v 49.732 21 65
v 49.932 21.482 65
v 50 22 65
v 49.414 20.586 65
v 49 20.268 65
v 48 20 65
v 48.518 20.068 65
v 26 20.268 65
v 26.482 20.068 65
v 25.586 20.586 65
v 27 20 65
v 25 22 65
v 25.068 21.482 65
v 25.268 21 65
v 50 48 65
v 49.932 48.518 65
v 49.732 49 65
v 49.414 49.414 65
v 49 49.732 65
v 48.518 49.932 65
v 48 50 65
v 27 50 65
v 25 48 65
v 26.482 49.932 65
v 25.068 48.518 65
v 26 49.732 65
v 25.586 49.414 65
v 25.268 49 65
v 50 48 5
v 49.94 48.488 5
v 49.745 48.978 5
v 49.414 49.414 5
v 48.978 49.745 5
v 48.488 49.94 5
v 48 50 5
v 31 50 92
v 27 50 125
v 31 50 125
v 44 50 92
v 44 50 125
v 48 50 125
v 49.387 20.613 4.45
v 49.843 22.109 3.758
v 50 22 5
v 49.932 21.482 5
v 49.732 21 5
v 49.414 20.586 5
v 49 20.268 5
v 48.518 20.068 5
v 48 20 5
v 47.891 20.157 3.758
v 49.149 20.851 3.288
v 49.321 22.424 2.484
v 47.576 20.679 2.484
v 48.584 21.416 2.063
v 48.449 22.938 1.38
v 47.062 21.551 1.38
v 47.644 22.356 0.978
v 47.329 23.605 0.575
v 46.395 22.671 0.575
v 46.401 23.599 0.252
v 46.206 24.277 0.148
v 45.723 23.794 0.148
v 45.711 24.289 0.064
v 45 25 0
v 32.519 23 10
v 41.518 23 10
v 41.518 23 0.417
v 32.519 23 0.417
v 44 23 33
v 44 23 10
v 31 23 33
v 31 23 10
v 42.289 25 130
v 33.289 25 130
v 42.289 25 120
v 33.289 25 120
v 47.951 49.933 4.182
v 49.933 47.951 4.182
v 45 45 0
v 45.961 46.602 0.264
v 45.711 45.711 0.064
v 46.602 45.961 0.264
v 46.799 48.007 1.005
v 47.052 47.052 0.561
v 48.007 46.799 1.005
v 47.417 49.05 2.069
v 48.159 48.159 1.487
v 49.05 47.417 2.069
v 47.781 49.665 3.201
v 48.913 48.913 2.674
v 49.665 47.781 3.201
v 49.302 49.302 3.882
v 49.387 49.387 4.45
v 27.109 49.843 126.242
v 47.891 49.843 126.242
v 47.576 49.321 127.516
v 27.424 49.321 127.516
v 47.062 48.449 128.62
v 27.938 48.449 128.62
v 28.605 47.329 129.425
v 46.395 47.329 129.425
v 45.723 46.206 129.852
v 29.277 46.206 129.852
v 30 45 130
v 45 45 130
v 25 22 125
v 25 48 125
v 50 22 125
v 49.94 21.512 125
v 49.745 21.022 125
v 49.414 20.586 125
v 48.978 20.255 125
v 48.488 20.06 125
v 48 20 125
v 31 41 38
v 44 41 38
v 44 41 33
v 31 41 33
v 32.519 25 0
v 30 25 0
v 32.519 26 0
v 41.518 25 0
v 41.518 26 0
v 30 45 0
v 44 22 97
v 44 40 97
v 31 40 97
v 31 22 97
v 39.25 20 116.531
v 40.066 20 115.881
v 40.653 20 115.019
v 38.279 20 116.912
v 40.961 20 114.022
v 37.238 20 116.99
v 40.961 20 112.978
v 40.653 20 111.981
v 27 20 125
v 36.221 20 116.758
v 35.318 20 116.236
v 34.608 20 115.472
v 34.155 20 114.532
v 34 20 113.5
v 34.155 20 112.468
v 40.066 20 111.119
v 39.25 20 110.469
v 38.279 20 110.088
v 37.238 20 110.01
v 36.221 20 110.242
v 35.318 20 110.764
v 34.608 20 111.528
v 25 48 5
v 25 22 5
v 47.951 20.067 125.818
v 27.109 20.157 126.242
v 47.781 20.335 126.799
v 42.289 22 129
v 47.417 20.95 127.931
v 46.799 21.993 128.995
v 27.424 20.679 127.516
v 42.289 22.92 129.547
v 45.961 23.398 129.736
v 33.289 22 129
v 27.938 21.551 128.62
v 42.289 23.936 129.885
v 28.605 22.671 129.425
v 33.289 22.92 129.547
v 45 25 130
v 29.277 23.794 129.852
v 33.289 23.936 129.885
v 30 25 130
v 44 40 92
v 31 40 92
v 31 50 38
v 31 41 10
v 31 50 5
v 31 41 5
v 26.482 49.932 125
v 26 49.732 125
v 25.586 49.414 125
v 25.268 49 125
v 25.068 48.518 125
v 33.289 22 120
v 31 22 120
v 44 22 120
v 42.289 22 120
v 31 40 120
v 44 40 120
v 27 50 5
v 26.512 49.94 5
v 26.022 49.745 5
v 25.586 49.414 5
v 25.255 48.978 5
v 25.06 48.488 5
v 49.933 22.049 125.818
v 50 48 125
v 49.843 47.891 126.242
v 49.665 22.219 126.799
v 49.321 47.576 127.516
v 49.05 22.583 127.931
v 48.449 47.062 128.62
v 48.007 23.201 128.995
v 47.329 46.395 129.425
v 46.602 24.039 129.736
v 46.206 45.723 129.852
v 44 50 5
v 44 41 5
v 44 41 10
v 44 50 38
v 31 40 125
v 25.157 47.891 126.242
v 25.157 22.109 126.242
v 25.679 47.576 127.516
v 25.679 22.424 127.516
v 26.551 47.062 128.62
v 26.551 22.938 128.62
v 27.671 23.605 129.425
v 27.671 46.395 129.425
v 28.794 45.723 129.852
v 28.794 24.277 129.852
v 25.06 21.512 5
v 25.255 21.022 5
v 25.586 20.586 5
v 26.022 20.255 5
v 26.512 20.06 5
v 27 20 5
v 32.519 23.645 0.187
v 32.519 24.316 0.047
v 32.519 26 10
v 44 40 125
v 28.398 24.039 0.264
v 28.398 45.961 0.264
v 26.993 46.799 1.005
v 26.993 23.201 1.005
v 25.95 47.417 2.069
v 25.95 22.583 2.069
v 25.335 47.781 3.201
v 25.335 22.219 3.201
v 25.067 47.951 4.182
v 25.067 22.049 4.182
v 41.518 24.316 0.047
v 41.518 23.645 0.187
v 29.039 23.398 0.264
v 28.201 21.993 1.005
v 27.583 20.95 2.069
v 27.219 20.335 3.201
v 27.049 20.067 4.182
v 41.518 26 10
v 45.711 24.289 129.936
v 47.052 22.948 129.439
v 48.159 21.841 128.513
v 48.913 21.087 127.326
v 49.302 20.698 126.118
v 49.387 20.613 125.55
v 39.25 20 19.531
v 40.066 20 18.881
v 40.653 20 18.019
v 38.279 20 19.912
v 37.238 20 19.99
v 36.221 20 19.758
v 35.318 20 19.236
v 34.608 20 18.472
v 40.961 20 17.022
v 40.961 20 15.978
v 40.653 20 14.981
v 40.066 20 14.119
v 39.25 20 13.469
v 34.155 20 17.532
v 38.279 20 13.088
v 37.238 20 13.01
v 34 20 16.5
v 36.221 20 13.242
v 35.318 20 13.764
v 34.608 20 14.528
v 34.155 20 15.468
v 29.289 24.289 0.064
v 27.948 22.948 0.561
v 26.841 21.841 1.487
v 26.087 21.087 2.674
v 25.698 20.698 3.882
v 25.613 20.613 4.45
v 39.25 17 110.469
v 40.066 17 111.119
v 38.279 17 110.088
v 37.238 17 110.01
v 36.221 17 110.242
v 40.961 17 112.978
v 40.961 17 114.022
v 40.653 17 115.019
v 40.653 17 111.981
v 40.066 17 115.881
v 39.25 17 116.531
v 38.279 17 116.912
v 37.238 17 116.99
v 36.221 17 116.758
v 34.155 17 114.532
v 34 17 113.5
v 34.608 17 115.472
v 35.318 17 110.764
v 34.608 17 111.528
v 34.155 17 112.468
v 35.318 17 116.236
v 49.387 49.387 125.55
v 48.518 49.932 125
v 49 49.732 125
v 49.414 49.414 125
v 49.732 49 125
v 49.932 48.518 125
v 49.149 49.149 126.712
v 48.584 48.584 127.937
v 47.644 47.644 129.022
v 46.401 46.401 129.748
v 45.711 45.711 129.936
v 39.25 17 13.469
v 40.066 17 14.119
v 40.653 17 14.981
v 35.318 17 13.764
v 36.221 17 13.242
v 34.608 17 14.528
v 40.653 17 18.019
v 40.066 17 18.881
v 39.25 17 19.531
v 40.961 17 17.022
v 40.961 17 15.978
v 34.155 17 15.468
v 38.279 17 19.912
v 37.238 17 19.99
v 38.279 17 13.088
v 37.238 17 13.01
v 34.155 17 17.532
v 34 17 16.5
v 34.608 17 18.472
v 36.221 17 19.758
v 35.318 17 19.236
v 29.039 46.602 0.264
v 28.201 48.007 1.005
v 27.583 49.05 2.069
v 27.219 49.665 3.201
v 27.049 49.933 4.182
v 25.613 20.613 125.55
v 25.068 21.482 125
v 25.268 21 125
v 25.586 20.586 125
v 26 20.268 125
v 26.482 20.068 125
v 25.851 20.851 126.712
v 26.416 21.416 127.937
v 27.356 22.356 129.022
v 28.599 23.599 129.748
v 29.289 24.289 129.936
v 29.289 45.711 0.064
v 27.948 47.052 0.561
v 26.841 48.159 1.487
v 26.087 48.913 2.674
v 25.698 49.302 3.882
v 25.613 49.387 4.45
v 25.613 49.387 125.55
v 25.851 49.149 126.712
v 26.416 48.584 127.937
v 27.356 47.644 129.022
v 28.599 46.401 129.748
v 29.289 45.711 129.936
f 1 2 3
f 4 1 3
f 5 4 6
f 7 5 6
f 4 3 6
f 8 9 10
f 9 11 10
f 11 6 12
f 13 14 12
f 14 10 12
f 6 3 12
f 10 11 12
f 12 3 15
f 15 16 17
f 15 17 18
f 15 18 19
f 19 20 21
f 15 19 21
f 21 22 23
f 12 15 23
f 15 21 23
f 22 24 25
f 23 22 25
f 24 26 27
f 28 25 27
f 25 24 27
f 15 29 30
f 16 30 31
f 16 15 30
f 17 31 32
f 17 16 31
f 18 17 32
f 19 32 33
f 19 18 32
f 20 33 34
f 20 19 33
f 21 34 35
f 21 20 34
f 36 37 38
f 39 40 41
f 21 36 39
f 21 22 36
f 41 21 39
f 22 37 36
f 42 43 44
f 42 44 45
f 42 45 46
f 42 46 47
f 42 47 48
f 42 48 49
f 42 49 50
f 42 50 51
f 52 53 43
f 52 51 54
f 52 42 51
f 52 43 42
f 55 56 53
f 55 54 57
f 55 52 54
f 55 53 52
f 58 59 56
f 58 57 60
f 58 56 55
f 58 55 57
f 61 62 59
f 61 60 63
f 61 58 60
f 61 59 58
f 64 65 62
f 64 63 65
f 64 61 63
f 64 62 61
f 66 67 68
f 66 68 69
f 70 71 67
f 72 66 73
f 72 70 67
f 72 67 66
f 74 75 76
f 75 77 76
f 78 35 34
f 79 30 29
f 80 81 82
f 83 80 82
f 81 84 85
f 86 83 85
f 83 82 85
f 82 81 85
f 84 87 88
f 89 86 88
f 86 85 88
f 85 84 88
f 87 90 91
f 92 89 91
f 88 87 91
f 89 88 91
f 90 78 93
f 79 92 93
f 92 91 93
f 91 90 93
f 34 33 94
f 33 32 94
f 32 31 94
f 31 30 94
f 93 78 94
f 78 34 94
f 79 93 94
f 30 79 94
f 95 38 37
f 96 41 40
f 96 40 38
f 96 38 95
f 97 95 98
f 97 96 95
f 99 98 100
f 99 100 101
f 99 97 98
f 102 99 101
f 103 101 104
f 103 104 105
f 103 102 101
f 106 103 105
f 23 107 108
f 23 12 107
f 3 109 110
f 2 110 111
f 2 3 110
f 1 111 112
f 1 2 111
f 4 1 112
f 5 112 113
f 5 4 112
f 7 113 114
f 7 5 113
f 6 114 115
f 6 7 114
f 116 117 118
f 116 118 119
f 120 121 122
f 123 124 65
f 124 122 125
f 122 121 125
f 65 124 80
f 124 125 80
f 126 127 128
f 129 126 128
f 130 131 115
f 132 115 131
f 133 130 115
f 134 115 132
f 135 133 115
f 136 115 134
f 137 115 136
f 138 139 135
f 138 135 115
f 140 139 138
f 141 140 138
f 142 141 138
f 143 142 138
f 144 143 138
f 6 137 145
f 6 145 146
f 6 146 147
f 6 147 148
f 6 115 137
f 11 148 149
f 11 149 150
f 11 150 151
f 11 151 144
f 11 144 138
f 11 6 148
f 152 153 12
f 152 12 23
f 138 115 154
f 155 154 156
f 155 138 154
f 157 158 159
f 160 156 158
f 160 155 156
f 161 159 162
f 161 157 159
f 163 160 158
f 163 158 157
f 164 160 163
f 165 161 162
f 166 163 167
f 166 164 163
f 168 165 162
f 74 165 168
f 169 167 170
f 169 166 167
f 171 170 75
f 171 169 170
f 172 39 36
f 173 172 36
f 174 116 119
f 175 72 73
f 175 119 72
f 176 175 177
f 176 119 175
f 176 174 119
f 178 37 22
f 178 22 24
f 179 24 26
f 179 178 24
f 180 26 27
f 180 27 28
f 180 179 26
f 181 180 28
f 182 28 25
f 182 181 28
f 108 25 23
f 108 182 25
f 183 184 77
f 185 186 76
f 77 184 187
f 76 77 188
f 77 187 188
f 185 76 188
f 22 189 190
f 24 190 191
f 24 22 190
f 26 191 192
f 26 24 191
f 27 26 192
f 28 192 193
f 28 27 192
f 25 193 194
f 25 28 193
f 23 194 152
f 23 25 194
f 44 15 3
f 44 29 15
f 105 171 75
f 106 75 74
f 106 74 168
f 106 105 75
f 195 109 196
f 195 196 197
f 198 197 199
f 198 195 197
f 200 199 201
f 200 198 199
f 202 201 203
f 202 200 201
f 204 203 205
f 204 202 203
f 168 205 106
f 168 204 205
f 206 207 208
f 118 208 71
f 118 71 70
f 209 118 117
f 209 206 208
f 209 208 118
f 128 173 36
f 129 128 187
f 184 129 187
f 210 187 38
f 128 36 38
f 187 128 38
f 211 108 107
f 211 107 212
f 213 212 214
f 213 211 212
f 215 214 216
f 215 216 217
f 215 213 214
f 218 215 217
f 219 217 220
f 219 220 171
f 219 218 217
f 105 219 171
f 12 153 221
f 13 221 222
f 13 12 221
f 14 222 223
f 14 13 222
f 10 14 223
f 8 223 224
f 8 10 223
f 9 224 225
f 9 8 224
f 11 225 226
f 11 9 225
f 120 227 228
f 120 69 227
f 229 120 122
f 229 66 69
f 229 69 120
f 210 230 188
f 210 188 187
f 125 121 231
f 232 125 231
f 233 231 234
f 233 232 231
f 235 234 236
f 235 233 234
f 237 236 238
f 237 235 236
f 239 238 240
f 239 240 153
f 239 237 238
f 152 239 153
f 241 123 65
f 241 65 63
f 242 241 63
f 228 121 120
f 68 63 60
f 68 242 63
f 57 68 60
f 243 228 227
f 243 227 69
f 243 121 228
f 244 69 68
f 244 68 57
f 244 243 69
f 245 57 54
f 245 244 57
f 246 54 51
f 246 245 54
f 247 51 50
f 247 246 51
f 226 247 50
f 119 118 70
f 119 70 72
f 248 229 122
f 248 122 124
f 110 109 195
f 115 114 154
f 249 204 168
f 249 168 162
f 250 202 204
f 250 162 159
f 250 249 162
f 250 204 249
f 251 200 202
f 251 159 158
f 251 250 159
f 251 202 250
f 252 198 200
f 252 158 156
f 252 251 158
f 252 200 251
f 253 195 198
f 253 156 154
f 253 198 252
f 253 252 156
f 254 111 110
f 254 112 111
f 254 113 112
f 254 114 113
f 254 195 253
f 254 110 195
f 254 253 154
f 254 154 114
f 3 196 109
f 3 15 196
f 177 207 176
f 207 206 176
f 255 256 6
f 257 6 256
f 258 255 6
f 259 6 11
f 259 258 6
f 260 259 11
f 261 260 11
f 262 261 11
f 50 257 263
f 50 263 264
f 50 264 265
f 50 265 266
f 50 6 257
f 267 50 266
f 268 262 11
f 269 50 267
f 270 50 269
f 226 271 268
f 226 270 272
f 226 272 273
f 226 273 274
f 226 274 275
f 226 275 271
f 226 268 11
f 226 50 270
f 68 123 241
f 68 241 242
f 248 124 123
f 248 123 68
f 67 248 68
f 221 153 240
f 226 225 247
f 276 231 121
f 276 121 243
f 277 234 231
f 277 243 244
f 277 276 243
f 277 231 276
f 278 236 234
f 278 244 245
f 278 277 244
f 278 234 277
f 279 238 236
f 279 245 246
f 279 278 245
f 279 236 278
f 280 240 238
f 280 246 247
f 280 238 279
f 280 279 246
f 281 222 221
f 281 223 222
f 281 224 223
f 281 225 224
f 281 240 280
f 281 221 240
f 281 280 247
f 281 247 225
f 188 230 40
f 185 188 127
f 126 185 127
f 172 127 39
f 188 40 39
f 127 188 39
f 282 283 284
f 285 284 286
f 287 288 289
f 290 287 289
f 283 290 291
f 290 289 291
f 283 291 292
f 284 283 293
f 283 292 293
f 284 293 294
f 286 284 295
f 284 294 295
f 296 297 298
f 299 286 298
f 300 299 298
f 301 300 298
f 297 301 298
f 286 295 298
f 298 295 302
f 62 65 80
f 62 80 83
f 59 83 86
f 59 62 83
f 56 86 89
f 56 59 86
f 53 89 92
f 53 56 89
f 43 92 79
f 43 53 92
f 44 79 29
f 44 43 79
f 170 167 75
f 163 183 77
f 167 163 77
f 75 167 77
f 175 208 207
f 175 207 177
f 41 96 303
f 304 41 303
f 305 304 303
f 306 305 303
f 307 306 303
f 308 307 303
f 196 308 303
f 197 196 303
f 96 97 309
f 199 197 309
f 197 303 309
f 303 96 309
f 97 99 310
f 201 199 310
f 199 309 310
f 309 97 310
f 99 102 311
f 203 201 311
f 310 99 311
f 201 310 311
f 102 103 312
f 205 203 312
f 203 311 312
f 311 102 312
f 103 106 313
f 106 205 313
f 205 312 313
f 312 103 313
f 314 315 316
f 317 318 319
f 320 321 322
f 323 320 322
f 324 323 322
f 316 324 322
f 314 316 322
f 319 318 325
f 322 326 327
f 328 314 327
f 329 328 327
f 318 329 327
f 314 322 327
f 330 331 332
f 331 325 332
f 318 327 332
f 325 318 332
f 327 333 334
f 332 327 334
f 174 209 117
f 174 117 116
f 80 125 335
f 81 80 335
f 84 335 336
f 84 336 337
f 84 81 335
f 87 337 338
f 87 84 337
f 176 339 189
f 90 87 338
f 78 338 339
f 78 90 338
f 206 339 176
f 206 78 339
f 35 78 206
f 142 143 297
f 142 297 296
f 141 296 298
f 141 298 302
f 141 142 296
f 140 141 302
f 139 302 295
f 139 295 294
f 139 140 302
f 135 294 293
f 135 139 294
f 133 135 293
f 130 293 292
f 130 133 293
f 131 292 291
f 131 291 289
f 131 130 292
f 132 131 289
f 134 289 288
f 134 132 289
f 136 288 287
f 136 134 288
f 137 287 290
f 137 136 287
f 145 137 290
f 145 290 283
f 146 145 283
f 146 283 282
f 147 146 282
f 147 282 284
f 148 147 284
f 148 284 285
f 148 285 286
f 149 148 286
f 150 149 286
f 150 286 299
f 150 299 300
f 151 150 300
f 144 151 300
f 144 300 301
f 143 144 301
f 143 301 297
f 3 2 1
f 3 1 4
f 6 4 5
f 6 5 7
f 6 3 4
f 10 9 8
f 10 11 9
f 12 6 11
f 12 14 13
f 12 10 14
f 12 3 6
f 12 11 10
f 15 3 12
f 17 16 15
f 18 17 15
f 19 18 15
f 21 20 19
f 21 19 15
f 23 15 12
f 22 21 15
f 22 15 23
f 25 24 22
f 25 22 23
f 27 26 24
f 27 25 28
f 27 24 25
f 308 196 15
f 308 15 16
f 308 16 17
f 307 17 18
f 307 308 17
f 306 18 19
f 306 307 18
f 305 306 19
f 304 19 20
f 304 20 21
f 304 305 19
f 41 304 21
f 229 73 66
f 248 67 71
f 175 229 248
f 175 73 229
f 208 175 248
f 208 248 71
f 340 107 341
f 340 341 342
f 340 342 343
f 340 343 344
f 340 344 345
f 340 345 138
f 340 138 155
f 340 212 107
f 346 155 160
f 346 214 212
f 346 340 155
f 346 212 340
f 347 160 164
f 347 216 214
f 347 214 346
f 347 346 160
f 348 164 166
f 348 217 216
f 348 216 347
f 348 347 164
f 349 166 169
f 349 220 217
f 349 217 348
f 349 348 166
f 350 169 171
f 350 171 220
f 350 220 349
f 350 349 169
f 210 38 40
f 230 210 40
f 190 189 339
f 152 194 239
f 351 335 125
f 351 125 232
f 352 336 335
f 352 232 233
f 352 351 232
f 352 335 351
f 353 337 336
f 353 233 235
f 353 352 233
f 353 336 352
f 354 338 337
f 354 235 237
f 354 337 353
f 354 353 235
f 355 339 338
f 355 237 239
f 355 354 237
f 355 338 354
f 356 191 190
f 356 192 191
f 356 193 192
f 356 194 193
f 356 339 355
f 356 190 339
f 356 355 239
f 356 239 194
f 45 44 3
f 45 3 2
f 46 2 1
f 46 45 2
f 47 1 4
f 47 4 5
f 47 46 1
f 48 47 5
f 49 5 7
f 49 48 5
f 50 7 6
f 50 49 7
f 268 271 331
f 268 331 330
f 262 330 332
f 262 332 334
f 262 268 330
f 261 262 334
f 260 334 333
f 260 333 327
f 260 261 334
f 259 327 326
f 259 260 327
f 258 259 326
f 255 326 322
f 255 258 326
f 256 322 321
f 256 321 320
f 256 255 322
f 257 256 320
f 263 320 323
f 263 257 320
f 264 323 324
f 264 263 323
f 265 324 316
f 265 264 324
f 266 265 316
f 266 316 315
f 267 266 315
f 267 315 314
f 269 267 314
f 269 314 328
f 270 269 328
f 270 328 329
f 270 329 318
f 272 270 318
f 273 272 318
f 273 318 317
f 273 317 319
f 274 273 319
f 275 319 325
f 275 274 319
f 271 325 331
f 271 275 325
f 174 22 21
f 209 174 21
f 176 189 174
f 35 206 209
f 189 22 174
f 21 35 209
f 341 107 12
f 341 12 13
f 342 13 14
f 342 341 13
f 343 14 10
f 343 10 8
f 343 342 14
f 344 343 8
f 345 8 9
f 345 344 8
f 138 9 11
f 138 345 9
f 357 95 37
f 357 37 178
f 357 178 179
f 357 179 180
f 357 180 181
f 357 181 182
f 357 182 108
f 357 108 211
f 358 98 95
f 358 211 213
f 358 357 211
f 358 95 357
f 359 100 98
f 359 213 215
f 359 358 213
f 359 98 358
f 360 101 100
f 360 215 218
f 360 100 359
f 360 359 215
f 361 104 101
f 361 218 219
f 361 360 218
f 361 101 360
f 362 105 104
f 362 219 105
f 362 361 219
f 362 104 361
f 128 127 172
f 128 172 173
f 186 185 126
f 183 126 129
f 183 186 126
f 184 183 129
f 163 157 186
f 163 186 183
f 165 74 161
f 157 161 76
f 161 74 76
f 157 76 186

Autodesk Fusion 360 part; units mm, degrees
sketch "Sketch1" plane through (0, 0, 0) normal (0, 0, 1) x (1, 0, 0)
  line L0 (25, 50) -> (55, 50)
  line L1 (55, 50) -> (55, 20)
  line L2 (55, 20) -> (25, 20)
  line L3 (25, 20) -> (25, 50)
extrude "Extrude1" add sketch "Sketch1" along normal blind 150 makes body 1
extrude "Extrude2" cut 1 faces at (55, 40, 50) along direction (-1, 0, 0) blind 5 on bodies 1 bodies 1
extrude "Extrude3" cut 1 faces at (33.3333, 30, 150) along direction (0, 0, -1) blind 10 on bodies 1 bodies 1
fillet "Fillet7" radius 5 1 faces at (33.3333, 30, 140) on bodies 1
fillet "Fillet8" radius 5 1 faces at (33.3333, 30, 0) on bodies 1
fillet "Fillet9" radius 2 14 faces at (33.3333, 50, 48.3333) (34.5665, 46.749, 0.3159) (35, 38.3333, 0) (34.9025, 24.4637, 0.0288) (41.6667, 20, 48.3333) (34.9025, 24.4637, 139.9712) (35, 38.3333, 140) (34.5665, 46.749, 139.6841) (29.4637, 31.5691, 139.9712) (25, 30, 48.3333) (29.4637, 31.5691, 0.0288) (46.749, 38.7668, 139.6841) (50, 40, 48.3333) (46.749, 38.7668, 0.3159) on bodies 1
sketch "Sketch4" plane through (0, 50, 0) normal (0, 1, 0) x (-1, 0, 0)
  line L0 (-48, 135) -> (-48, 5)
  line L1 (-48, 5) -> (-27, 5)
  line L2 (-27, 5) -> (-27, 135)
  line L3 (-27, 135) -> (-48, 135)
  line L4 (-37.5, 5) -> (-31, 5)
  line L5 (-31, 5) -> (-44, 5)
  line L6 (-44, 5) -> (-44, 38)
  line L7 (-44, 38) -> (-31, 38)
  line L8 (-31, 38) -> (-31, 5)
  line L9 (-31, 5) -> (-31, 10)
  line L10 (-31, 10) -> (-44, 10)
  line L11 (-44, 10) -> (-44, 33)
  line L12 (-44, 33) -> (-31, 33)
  line L13 (-31, 33) -> (-31, 10)
  circle A0 centre (-37.5, 16.5) radius 3.5
  line L14 (-44, 102) -> (-31, 102)
  line L15 (-44, 107) -> (-31, 107)
  line L16 (-31, 102) -> (-31, 135)
  line L17 (-44, 130) -> (-44, 107)
  line L18 (-44, 135) -> (-44, 102)
  line L19 (-31, 130) -> (-44, 130)
  line L20 (-31, 135) -> (-44, 135)
  circle A1 centre (-37.5, 123.5) radius 3.5
extrude "Extrude4" cut sketch "Sketch4" against normal blind 27 contours L6 L8 L10 L11 L12 L13 | A0 bodies 1
sketch "Sketch5" plane through (0, 0, 10) normal (0, 0, 1) x (-1, 0, 0)
  line L0 (-44, -50) -> (-31, -50)
  line L1 (-31, -50) -> (-31, -23)
  line L2 (-31, -23) -> (-44, -23)
  line L3 (-44, -23) -> (-44, -50)
  line L4 (-41.5185, -23) -> (-32.5185, -23)
  line L5 (-32.5185, -23) -> (-32.5185, -26)
  line L6 (-32.5185, -26) -> (-41.5185, -26)
  line L7 (-41.5185, -26) -> (-41.5185, -23)
  dimension "d42" = 9
  dimension "d43" = 3
extrude "Extrude5" cut sketch "Sketch5" against normal blind 11 contours L2 L4 L5 L6 L7 bodies 1
extrude "Extrude6" add sketch "Sketch4" against normal blind 4 from surface at -30 contours A0 bodies 1
extrude "Extrude7" cut sketch "Sketch4" against normal blind 27 contours L15 L16 L17 L18 L19 | A1 bodies 1
extrude "Extrude8" add sketch "Sketch4" against normal blind 4 from surface at -30 contours A1 bodies 1
sketch "Sketch6" plane through (0, 0, 130) normal (0, 0, -1) x (1, 0, 0)
  line L0 (31, -50) -> (44, -50)
  line L1 (44, -50) -> (44, -23)
  line L2 (44, -23) -> (31, -23)
  line L3 (31, -23) -> (31, -50)
  line L4 (41.5626, -23) -> (32.5626, -23)
  line L5 (32.5626, -23) -> (32.5626, -26)
  line L6 (32.5626, -26) -> (41.5626, -26)
  line L7 (41.5626, -26) -> (41.5626, -23)
  dimension "d54" = 9
  dimension "d55" = 3
extrude "Extrude14" cut 1 faces at (35.3333, 23, 114.6667) along direction (0, -1, 0) blind 1 on bodies 1 bodies 1
extrude "Extrude15" cut 1 faces at (37.2404, 16, 122.3626) along direction (0, 1, 0) blind 1 on bodies 1 bodies 1
extrude "Extrude16" cut 1 faces at (37.1409, 16, 17.4466) along direction (0, 1, 0) blind 1 on bodies 1 bodies 1
extrude "Extrude17" cut 1 faces at (37.2404, 17, 122.3626) along direction (0, 1, 0) blind 1 on bodies 1 bodies 1
extrude "Extrude18" cut sketch "Sketch4" against normal blind 9 contours L3 L16 L18 L19 L20 | L1 L4 L5 L6 L8 L9 L10 | L14 L15 L16 L18 | L6 L7 L8 L12 bodies 1
extrude "Extrude19" cut 2 faces at (39.6667, 41, 131.6667) (39.6667, 41, 105.3333) along direction (0, -1, 0) blind 1 on bodies 1 bodies 1
sketch "Sketch7" plane through (0, 0, 130) normal (0, 0, -1) x (1, 0, 0)
  line L0 (31, -40) -> (44, -40)
  line L1 (44, -40) -> (44, -22)
  line L2 (44, -22) -> (31, -22)
  line L3 (31, -22) -> (31, -40)
  line L4 (42.2889, -22) -> (33.2889, -22)
  line L5 (33.2889, -22) -> (33.2889, -25)
  line L6 (33.2889, -25) -> (42.2889, -25)
  line L7 (42.2889, -25) -> (42.2889, -22)
  dimension "d78" = 9
  dimension "d79" = 3
extrude "Extrude20" cut sketch "Sketch7" against normal blind 18 contours L2 L4 L5 L6 L7 bodies 1
extrude "Extrude21" add 1 faces at (37.2404, 18, 122.3626) along direction (0, -1, 0) blind 1 on bodies 1 bodies 1
sketch "Sketch8" plane through (50, 0, 0) normal (1, 0, 0) x (0, 1, 0)
  line L0 (22, 135) -> (22, 5)
  line L1 (22, 5) -> (48, 5)
  line L2 (48, 5) -> (48, 135)
  line L3 (48, 135) -> (22, 135)
  line L4 (48, 70) -> (22, 70)
  line L5 (48, 75) -> (22, 75)
  line L6 (48, 65) -> (22, 65)
  line L7 (22, 75) -> (48, 75)
  line L8 (48, 65) -> (22, 65)
extrude "Extrude22" cut sketch "Sketch8" against normal blind 40 contours L0 L2 L4 L5 L7 | L0 L2 L4 L6 L8 bodies 1
extrude "Extrude23" cut 1 faces at (41.6667, 48, 68.3333) along direction (0, 1, 0) blind 5 on bodies 1 bodies 1
extrude "Extrude24" cut 1 faces at (41.6667, 22, 71.6667) along direction (0, -1, 0) blind 16 on bodies 1 bodies 1 makes body 2 at (25, 30.6667, 25)
copy_body "Body->Comp1" bodies 1 removing the originals makes body 3 in component "Component"
copy_body "Body->Comp2" bodies 2 removing the originals makes body 4 in component "Component'"
extrude "Extrude9" [suppressed]
extrude "Extrude10" [suppressed]
extrude "Extrude11" [suppressed]
extrude "Extrude12" [suppressed]
extrude "Extrude13" [suppressed]
fillet "Fillet4" [suppressed]
fillet "Fillet5" [suppressed]
fillet "Fillet6" [suppressed]
sketch "Sketch3" plane through (0, 50, 0) normal (0, 1, 0) x (-1, 0, 0)
  line L0 (-48, 140) -> (-48, 5)
  line L1 (-48, 5) -> (-27, 5)
  line L2 (-27, 5) -> (-27, 140)
  line L3 (-27, 140) -> (-48, 140)
  line L4 (-44.5, 5) -> (-30.5, 5)
  line L5 (-30.5, 5) -> (-30.5, 30)
  line L6 (-30.5, 30) -> (-44.5, 30)
  line L7 (-44.5, 30) -> (-44.5, 5)
fillet "Fillet1" [suppressed]
fillet "Fillet2" [suppressed]
fillet "Fillet3" [suppressed]
component "Component" placed x (1, 0, 0) y (0, 1, 0) z (0, 0, 1) at (0, 0, -10)
component "Component'" placed x (1, 0, 0) y (0, 1, 0) z (0, 0, 1) at (0, 0, 0)
